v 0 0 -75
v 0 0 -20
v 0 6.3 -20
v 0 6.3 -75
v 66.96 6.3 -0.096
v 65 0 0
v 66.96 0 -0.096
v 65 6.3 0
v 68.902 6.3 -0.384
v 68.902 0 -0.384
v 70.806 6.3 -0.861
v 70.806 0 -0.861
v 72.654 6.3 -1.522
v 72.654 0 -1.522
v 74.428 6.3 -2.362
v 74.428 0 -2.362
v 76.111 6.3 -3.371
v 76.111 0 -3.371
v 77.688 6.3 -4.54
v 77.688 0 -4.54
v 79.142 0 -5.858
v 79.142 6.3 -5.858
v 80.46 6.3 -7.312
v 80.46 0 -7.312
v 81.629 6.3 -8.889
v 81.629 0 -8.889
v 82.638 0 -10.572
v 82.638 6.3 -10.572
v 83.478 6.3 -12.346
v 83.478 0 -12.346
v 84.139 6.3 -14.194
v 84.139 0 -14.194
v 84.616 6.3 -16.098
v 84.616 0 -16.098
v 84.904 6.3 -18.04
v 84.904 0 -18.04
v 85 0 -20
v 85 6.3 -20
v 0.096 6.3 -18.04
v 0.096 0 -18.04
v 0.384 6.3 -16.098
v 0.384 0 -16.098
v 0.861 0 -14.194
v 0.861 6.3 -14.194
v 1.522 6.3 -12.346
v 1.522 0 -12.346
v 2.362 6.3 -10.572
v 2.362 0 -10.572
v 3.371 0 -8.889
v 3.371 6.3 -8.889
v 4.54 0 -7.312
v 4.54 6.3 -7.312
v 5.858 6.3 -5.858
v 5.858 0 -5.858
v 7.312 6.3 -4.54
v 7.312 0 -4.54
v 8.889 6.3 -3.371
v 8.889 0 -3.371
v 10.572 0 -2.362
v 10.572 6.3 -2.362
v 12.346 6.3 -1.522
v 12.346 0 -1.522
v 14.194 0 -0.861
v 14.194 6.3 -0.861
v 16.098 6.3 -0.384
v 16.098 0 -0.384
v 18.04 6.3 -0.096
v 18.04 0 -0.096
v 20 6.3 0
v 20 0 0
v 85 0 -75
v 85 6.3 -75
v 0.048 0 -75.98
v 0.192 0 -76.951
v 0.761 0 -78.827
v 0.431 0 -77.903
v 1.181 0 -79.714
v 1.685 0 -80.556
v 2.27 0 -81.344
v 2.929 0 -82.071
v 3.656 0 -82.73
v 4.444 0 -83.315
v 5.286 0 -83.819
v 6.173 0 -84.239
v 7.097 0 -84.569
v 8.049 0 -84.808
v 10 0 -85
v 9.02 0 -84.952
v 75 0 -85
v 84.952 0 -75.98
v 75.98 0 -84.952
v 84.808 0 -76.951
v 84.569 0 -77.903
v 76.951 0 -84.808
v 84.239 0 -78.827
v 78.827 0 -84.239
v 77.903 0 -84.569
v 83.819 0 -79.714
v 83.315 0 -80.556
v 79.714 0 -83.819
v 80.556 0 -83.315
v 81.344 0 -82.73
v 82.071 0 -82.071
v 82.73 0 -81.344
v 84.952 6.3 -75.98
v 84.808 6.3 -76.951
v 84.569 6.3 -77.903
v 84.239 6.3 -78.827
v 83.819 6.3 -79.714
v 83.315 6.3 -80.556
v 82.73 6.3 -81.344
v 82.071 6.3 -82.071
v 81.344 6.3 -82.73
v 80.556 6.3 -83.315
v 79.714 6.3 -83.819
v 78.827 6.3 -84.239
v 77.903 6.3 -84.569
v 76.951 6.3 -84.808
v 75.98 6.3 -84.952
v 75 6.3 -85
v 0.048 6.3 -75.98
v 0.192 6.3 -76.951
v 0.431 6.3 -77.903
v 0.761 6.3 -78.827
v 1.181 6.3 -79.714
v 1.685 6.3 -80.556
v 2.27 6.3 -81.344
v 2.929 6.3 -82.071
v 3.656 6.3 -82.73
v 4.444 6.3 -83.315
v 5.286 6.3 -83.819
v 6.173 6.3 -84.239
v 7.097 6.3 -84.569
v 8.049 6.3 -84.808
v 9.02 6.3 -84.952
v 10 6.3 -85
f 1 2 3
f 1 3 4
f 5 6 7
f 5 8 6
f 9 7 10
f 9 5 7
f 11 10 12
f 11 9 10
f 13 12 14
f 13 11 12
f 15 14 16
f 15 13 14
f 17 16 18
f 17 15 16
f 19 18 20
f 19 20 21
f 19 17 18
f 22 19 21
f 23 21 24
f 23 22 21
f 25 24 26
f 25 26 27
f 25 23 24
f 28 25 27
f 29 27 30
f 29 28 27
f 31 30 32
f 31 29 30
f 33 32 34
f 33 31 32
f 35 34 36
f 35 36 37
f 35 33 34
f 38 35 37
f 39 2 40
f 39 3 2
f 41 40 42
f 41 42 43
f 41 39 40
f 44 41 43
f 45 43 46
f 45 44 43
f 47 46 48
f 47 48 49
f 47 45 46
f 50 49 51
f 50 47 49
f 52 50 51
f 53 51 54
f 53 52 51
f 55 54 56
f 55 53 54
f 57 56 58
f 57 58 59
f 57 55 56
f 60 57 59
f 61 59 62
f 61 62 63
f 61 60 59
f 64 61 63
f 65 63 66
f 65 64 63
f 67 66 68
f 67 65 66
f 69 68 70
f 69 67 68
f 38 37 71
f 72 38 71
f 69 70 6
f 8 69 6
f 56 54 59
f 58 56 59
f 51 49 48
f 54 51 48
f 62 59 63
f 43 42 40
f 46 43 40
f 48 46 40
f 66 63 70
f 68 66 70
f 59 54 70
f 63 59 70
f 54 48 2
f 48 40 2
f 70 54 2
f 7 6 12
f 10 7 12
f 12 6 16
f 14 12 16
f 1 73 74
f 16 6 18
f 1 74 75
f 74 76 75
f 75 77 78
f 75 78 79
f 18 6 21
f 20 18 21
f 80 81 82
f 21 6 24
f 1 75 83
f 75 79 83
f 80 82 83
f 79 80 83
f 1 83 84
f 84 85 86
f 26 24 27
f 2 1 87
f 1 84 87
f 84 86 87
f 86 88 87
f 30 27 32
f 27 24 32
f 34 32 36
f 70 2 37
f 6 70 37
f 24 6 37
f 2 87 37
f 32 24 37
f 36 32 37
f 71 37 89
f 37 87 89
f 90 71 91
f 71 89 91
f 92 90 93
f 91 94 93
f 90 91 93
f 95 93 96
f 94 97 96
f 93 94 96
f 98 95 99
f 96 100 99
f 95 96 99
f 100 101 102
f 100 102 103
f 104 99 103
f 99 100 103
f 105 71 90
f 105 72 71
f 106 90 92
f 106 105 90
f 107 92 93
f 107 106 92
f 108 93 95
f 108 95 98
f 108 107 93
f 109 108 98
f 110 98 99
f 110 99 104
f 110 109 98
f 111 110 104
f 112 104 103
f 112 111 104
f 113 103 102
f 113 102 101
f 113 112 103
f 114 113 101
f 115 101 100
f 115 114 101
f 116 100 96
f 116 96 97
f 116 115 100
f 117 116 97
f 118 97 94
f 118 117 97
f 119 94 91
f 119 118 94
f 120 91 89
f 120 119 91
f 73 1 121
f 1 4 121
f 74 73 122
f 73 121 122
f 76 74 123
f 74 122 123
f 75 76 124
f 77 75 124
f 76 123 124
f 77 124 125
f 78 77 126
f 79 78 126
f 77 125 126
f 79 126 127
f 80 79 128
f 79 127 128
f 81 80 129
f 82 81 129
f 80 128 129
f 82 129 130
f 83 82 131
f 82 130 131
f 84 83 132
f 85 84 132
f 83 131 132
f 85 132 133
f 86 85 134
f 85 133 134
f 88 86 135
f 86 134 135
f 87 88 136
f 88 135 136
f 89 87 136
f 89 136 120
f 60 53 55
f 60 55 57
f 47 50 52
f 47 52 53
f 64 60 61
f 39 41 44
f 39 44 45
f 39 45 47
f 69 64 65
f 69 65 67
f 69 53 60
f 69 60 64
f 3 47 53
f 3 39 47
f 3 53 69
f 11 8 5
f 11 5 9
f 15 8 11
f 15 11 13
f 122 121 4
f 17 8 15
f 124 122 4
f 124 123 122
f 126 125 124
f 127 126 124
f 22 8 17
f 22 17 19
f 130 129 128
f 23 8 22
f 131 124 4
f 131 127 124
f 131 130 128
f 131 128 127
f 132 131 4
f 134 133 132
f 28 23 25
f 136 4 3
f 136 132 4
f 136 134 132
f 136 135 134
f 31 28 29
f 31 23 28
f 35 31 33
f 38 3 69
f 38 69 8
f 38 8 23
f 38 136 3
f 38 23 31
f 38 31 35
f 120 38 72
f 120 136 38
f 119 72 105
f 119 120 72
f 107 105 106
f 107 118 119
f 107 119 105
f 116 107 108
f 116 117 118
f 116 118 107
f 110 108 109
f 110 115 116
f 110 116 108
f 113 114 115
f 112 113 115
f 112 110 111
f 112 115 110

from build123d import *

# Parameters (mm, degrees)
SKETCH1_W           = 85
SKETCH1_H           = 85
BOSS_EXTRUDE1_DEPTH = 6.3
FILLET1_R           = 10
FILLET2_R           = 20


with BuildPart() as part:
    # Sketch1 → Boss-Extrude1 (new body)
    with BuildSketch(Plane(origin=(0, 0, 0), x_dir=(1, 0, 0), z_dir=(0, 1, 0))):
        with Locations((42.5, 42.5)):
            Rectangle(SKETCH1_W, SKETCH1_H)
    extrude(amount=BOSS_EXTRUDE1_DEPTH)

    # Fillet1
    fillet1_edges = [part.edges().sort_by_distance(p)[0] for p in [
        (0, 3.15, -85),
        (85, 3.15, -85),
    ]]
    fillet(fillet1_edges, radius=FILLET1_R)

    # Fillet2
    fillet2_edges = [part.edges().sort_by_distance(p)[0] for p in [
        (85, 3.15, 0),
        (0, 3.15, 0),
    ]]
    fillet(fillet2_edges, radius=FILLET2_R)


solid = part.part
